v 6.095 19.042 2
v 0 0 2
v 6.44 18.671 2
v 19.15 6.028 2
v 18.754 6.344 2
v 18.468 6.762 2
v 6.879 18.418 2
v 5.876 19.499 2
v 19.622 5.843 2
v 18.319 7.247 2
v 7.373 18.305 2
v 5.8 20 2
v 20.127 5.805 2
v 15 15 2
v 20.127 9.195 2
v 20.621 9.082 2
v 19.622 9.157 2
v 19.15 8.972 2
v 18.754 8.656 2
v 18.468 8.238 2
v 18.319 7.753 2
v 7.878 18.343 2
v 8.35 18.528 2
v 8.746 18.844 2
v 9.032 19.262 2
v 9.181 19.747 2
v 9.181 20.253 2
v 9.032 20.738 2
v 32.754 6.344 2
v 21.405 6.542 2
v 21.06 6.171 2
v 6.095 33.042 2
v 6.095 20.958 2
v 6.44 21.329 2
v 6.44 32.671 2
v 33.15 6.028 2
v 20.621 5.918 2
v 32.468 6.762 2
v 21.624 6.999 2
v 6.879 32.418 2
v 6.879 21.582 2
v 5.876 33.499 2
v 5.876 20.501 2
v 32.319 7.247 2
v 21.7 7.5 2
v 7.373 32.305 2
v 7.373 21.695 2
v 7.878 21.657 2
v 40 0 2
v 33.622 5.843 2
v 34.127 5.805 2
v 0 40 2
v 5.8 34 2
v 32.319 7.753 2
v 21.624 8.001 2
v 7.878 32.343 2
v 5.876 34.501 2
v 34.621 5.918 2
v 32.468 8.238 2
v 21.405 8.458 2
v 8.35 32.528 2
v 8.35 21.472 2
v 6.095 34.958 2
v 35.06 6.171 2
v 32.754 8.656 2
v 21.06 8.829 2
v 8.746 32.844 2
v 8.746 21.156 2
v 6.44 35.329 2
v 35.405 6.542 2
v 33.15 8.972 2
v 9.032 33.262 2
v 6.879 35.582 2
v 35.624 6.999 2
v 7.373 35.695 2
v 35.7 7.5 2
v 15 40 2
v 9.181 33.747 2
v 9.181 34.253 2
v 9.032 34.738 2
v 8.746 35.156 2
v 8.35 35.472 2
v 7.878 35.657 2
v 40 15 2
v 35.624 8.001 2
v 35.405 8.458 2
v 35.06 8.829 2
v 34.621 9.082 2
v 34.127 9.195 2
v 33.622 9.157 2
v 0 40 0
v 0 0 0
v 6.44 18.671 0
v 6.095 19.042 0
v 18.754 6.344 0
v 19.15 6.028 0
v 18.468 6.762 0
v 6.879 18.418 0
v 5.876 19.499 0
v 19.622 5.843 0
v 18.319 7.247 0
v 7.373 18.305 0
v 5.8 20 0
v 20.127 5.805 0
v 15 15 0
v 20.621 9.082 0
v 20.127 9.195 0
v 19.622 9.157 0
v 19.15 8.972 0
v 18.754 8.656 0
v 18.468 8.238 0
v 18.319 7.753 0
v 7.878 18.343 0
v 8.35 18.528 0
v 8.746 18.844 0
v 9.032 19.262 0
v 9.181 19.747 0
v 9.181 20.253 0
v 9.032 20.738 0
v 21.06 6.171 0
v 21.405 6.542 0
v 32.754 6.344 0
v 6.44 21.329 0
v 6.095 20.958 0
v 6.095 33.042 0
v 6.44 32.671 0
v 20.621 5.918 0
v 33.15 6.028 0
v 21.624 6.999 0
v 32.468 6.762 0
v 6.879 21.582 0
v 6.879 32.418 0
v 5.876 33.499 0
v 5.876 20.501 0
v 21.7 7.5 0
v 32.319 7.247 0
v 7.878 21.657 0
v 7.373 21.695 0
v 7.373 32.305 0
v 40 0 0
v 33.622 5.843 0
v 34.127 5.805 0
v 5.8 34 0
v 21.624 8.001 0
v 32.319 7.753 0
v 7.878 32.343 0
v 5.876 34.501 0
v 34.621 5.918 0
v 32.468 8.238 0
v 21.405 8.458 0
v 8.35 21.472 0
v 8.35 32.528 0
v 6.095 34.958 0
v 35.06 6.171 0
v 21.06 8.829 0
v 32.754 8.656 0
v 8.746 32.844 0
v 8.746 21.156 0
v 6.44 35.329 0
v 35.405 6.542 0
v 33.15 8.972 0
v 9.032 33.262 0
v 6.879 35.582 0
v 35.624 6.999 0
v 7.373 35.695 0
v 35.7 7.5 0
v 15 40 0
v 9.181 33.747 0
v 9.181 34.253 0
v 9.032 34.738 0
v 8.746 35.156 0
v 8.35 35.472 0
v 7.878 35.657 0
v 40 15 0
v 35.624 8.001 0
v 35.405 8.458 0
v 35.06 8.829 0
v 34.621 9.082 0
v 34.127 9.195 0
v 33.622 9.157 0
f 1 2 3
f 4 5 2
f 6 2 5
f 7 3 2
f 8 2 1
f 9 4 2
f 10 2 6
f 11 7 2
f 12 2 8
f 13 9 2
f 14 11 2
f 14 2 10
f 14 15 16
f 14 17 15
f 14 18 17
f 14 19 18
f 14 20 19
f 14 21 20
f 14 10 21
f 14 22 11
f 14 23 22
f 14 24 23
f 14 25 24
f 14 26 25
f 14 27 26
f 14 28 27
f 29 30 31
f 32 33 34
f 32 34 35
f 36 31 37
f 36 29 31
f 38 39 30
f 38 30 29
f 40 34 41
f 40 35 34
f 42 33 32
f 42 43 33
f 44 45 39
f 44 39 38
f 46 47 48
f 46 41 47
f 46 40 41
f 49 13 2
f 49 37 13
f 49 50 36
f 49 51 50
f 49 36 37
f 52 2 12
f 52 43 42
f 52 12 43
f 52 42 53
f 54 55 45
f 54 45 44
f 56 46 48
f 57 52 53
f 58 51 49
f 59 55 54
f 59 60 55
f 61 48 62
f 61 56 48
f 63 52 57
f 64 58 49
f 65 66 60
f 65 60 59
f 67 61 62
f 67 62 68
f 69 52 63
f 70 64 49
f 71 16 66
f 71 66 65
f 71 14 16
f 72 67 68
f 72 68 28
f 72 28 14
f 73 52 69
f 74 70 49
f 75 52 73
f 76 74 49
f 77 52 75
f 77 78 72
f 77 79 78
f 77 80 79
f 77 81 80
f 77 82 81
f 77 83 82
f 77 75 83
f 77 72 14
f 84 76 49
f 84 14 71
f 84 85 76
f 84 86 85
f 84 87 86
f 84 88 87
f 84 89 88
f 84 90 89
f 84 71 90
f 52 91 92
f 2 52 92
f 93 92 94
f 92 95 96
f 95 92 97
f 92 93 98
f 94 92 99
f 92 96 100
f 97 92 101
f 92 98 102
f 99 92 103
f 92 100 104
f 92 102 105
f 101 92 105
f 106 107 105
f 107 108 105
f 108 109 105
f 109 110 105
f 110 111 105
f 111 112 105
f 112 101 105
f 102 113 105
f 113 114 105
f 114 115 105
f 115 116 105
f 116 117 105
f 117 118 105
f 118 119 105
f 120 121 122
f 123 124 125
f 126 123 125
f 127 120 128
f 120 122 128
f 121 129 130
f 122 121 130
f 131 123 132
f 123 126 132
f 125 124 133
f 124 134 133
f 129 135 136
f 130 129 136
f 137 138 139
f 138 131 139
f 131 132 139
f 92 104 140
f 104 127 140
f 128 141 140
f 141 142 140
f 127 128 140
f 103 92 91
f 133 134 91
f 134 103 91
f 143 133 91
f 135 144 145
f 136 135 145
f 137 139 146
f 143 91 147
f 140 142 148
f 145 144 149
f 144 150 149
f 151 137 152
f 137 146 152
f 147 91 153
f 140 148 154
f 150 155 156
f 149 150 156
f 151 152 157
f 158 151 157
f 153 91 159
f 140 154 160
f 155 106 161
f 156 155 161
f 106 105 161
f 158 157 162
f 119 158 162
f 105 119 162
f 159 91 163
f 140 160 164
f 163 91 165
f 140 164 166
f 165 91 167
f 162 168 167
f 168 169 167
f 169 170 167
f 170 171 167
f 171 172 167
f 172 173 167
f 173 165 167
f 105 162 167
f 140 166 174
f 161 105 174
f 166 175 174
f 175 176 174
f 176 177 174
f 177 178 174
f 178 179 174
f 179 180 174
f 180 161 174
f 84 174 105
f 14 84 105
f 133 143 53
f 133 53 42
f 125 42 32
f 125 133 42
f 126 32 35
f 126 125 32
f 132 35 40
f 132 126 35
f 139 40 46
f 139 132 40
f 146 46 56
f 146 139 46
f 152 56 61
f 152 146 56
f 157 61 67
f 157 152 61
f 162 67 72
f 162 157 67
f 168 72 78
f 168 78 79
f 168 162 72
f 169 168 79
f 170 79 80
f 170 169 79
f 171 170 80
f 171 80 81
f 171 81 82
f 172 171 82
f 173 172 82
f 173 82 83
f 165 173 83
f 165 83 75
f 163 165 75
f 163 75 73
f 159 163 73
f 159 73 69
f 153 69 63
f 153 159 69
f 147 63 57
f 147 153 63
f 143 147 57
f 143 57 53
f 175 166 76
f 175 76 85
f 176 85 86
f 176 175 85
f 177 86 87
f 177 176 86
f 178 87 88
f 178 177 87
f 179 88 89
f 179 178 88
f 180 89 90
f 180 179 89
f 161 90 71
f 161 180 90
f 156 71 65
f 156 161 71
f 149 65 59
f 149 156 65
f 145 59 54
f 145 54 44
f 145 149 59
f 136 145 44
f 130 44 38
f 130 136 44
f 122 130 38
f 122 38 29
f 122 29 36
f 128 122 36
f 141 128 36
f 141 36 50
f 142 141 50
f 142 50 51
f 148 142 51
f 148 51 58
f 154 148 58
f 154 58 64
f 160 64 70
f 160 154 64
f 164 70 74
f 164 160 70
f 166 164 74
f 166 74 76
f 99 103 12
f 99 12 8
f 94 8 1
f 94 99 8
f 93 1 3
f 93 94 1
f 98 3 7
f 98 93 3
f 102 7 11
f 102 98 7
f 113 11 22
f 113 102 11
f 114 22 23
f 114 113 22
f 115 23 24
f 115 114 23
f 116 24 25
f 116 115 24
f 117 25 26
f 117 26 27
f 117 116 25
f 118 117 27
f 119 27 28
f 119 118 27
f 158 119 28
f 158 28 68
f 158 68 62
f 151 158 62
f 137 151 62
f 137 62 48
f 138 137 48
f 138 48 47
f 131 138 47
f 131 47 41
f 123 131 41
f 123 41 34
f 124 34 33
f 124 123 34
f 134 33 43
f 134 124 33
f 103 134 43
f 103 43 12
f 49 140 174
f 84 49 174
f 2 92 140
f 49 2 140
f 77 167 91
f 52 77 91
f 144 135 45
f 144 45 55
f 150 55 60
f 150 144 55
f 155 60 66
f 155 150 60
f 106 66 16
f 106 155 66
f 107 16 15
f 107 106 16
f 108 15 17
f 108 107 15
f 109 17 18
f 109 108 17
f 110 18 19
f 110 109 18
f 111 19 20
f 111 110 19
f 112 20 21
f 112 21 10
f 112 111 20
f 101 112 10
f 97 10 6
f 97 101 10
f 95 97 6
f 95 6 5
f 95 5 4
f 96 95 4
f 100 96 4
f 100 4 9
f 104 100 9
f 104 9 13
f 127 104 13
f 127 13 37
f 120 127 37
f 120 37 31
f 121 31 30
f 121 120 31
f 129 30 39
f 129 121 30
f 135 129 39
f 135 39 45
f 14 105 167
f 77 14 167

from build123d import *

# Parameters (mm, degrees)
SKETCH_1_R      = 1.7
EXTRUDE_1_DEPTH = 2


with BuildPart() as part:
    # 草图1 → 凸台-拉伸1 (new body)
    with BuildSketch(Plane.XY):
        Polygon((0, 0), (40, 0), (40, 15), (15, 15), (15, 40), (0, 40), align=None)
        with Locations((20, 7.5)):
            Circle(SKETCH_1_R, mode=Mode.SUBTRACT)
        with Locations((34, 7.5)):
            Circle(SKETCH_1_R, mode=Mode.SUBTRACT)
        with Locations(Location((7.5, 34, 0), (0, 0, 180))):
            Circle(SKETCH_1_R, mode=Mode.SUBTRACT)
        with Locations(Location((7.5, 20, 0), (0, 0, 180))):
            Circle(SKETCH_1_R, mode=Mode.SUBTRACT)
    extrude(amount=EXTRUDE_1_DEPTH)


solid = part.part
